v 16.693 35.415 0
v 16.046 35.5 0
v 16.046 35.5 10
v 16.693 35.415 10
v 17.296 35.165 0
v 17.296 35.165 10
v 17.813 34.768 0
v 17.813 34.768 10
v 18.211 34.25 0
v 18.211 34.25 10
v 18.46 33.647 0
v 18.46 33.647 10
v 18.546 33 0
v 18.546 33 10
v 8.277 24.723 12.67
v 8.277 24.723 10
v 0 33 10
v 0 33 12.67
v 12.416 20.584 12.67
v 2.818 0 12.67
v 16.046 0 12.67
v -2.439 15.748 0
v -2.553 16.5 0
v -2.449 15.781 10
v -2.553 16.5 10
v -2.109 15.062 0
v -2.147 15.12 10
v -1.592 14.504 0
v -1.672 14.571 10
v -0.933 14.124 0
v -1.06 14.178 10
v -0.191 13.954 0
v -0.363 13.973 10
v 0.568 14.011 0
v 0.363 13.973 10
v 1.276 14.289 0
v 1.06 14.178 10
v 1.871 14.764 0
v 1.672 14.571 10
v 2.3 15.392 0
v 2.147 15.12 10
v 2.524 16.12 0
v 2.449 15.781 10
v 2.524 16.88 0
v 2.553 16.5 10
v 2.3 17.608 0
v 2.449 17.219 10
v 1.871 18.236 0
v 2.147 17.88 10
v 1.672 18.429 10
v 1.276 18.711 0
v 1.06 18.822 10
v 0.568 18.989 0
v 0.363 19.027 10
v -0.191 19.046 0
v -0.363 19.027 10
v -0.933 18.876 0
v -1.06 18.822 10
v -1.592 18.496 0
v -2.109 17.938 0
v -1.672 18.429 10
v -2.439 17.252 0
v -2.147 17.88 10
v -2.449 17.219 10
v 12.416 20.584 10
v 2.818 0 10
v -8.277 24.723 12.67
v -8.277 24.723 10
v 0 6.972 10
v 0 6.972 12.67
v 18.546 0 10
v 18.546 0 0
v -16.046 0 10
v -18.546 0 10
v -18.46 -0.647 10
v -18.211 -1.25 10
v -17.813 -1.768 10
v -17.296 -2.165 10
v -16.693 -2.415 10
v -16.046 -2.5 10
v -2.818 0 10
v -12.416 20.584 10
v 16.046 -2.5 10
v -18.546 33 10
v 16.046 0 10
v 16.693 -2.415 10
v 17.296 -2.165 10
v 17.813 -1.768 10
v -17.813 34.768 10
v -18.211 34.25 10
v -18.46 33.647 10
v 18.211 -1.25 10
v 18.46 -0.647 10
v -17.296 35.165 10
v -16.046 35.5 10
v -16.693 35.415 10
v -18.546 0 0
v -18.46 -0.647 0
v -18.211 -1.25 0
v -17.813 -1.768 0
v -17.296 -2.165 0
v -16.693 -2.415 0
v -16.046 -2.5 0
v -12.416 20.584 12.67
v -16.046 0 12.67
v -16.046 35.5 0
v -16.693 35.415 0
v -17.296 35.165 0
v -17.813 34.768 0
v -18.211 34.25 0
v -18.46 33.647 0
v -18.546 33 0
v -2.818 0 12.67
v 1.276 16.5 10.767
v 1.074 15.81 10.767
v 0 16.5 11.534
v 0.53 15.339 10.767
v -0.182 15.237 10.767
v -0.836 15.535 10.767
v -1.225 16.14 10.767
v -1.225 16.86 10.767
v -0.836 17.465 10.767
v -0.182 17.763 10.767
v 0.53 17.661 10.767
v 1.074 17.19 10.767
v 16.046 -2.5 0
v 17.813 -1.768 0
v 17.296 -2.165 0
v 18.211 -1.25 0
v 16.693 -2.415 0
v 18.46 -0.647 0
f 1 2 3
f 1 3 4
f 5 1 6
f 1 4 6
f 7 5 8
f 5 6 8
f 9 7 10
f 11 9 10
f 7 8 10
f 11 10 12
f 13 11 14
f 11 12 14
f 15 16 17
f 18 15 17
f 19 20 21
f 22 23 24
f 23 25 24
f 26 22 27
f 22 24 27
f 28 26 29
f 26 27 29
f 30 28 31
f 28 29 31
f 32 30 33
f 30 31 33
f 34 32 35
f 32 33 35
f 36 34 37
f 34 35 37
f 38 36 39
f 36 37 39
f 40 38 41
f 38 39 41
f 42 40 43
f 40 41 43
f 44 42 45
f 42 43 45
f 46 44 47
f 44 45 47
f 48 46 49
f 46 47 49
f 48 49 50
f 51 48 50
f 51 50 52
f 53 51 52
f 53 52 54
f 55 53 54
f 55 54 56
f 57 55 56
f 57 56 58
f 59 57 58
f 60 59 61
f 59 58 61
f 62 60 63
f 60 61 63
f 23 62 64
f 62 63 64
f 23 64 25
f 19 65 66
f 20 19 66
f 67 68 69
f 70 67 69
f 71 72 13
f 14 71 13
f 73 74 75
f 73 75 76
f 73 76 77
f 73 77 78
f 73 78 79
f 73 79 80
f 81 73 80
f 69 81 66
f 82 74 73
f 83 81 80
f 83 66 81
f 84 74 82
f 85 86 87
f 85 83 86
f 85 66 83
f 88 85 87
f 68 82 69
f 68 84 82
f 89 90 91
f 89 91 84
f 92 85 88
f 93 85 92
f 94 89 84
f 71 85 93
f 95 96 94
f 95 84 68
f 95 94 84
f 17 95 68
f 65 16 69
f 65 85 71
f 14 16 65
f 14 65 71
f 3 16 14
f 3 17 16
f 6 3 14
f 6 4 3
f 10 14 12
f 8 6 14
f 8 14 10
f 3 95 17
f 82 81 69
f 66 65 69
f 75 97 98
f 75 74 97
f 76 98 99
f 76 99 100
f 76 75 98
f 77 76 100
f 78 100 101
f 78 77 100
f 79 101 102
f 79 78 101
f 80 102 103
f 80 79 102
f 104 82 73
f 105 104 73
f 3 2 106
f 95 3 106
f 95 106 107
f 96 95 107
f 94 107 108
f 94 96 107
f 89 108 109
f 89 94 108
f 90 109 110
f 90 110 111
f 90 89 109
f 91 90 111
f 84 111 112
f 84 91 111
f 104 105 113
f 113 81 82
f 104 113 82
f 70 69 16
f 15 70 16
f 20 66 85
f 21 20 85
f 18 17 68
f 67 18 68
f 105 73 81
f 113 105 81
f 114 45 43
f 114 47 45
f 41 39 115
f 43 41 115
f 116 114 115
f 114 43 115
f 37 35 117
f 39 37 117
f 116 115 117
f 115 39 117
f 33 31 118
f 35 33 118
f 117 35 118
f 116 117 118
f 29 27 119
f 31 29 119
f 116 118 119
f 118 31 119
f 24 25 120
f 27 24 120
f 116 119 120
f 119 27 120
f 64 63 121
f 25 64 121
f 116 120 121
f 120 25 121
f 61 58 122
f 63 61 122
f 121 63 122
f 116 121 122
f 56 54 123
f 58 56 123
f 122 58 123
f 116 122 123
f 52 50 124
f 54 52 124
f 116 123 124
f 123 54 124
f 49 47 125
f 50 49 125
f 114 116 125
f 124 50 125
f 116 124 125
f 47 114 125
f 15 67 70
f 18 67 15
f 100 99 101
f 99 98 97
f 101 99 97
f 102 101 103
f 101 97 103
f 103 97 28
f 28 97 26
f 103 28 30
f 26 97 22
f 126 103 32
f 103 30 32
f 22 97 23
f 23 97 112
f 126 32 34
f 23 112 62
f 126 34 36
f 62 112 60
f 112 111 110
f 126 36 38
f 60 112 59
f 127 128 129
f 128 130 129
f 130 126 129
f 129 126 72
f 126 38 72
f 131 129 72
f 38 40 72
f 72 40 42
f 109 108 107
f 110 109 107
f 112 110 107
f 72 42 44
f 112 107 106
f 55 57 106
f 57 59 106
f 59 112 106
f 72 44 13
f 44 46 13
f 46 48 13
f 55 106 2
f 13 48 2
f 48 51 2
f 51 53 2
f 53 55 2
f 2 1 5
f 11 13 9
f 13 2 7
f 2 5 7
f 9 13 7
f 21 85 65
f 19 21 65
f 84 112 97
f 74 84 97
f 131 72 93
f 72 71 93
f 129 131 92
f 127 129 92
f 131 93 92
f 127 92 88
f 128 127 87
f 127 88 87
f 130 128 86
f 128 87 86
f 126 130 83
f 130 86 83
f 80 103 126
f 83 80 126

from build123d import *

# Parameters (mm, degrees)
F1_DEPTH = 10
F2_DEPTH = 12.67
F4_D     = 5.1054
F4_DEPTH = 10
F4_TIP   = 1.5338169022
F5_R     = 2.5


with BuildPart() as f1:
    # F0 (on Top) → F1 (new body)
    with BuildSketch(Plane.XY):
        Polygon((-8.2773605124, 24.7226394876), (0, 33), (8.2773605124, 24.7226394876), (12.4160407685, 20.5839592315), (18.5455481509, 14.4544518491), (18.5455481509, 35.5), (-18.5455481509, 35.5), (-18.5455481509, 14.4544518491), (-12.4160407685, 20.5839592315), align=None)
        Polygon((0, 0), (-2.8175829438, 0), (-16.0455481509, 0), (-18.5455481509, 0), (-18.5455481509, -2.5), (18.5455481509, -2.5), (18.5455481509, 0), (16.0455481509, 0), (2.8175829438, 0), align=None)
        Polygon((-16.0455481509, 0), (-12.4160407685, 20.5839592315), (-18.5455481509, 14.4544518491), (-18.5455481509, 0), align=None)
        Polygon((-2.8175829438, 0), (-12.4160407685, 20.5839592315), (-16.0455481509, 0), align=None)
        Polygon((0, 6.9717825853), (-8.2773605124, 24.7226394876), (-12.4160407685, 20.5839592315), (-2.8175829438, 0), (0, 0), (2.8175829438, 0), (12.4160407685, 20.5839592315), (8.2773605124, 24.7226394876), align=None)
        Polygon((16.0455481509, 0), (12.4160407685, 20.5839592315), (2.8175829438, 0), align=None)
        Polygon((18.5455481509, 14.4544518491), (12.4160407685, 20.5839592315), (16.0455481509, 0), (18.5455481509, 0), align=None)
        Polygon((8.2773605124, 24.7226394876), (0, 33), (-8.2773605124, 24.7226394876), (0, 6.9717825853), align=None)
    extrude(amount=F1_DEPTH)

    # F0 (on Top) → F2 (join)
    with BuildSketch(Plane.XY):
        Polygon((16.0455481509, 0), (12.4160407685, 20.5839592315), (2.8175829438, 0), align=None)
        Polygon((8.2773605124, 24.7226394876), (0, 33), (-8.2773605124, 24.7226394876), (0, 6.9717825853), align=None)
        Polygon((-2.8175829438, 0), (-12.4160407685, 20.5839592315), (-16.0455481509, 0), align=None)
    extrude(amount=F2_DEPTH)

    # F4
    with Locations(Plane(origin=(0, 0, 0), x_dir=(1, 0, 0), z_dir=(0, 0, -1))):
        with Locations((0, -16.5)):
            Hole(F4_D / 2, depth=F4_DEPTH)
            with Locations((0, 0, -(F4_DEPTH + F4_TIP / 2))):  # 118° drill point
                Cone(0, F4_D / 2, F4_TIP, mode=Mode.SUBTRACT)

    # F5
    f5_edges = [f1.edges().sort_by_distance(p)[0] for p in [
        (-18.545548, 35.5, 5),
        (18.545548, 35.5, 5),
        (18.545548, -2.5, 5),
        (-18.545548, -2.5, 5),
    ]]
    fillet(f5_edges, radius=F5_R)


solid = f1.part
